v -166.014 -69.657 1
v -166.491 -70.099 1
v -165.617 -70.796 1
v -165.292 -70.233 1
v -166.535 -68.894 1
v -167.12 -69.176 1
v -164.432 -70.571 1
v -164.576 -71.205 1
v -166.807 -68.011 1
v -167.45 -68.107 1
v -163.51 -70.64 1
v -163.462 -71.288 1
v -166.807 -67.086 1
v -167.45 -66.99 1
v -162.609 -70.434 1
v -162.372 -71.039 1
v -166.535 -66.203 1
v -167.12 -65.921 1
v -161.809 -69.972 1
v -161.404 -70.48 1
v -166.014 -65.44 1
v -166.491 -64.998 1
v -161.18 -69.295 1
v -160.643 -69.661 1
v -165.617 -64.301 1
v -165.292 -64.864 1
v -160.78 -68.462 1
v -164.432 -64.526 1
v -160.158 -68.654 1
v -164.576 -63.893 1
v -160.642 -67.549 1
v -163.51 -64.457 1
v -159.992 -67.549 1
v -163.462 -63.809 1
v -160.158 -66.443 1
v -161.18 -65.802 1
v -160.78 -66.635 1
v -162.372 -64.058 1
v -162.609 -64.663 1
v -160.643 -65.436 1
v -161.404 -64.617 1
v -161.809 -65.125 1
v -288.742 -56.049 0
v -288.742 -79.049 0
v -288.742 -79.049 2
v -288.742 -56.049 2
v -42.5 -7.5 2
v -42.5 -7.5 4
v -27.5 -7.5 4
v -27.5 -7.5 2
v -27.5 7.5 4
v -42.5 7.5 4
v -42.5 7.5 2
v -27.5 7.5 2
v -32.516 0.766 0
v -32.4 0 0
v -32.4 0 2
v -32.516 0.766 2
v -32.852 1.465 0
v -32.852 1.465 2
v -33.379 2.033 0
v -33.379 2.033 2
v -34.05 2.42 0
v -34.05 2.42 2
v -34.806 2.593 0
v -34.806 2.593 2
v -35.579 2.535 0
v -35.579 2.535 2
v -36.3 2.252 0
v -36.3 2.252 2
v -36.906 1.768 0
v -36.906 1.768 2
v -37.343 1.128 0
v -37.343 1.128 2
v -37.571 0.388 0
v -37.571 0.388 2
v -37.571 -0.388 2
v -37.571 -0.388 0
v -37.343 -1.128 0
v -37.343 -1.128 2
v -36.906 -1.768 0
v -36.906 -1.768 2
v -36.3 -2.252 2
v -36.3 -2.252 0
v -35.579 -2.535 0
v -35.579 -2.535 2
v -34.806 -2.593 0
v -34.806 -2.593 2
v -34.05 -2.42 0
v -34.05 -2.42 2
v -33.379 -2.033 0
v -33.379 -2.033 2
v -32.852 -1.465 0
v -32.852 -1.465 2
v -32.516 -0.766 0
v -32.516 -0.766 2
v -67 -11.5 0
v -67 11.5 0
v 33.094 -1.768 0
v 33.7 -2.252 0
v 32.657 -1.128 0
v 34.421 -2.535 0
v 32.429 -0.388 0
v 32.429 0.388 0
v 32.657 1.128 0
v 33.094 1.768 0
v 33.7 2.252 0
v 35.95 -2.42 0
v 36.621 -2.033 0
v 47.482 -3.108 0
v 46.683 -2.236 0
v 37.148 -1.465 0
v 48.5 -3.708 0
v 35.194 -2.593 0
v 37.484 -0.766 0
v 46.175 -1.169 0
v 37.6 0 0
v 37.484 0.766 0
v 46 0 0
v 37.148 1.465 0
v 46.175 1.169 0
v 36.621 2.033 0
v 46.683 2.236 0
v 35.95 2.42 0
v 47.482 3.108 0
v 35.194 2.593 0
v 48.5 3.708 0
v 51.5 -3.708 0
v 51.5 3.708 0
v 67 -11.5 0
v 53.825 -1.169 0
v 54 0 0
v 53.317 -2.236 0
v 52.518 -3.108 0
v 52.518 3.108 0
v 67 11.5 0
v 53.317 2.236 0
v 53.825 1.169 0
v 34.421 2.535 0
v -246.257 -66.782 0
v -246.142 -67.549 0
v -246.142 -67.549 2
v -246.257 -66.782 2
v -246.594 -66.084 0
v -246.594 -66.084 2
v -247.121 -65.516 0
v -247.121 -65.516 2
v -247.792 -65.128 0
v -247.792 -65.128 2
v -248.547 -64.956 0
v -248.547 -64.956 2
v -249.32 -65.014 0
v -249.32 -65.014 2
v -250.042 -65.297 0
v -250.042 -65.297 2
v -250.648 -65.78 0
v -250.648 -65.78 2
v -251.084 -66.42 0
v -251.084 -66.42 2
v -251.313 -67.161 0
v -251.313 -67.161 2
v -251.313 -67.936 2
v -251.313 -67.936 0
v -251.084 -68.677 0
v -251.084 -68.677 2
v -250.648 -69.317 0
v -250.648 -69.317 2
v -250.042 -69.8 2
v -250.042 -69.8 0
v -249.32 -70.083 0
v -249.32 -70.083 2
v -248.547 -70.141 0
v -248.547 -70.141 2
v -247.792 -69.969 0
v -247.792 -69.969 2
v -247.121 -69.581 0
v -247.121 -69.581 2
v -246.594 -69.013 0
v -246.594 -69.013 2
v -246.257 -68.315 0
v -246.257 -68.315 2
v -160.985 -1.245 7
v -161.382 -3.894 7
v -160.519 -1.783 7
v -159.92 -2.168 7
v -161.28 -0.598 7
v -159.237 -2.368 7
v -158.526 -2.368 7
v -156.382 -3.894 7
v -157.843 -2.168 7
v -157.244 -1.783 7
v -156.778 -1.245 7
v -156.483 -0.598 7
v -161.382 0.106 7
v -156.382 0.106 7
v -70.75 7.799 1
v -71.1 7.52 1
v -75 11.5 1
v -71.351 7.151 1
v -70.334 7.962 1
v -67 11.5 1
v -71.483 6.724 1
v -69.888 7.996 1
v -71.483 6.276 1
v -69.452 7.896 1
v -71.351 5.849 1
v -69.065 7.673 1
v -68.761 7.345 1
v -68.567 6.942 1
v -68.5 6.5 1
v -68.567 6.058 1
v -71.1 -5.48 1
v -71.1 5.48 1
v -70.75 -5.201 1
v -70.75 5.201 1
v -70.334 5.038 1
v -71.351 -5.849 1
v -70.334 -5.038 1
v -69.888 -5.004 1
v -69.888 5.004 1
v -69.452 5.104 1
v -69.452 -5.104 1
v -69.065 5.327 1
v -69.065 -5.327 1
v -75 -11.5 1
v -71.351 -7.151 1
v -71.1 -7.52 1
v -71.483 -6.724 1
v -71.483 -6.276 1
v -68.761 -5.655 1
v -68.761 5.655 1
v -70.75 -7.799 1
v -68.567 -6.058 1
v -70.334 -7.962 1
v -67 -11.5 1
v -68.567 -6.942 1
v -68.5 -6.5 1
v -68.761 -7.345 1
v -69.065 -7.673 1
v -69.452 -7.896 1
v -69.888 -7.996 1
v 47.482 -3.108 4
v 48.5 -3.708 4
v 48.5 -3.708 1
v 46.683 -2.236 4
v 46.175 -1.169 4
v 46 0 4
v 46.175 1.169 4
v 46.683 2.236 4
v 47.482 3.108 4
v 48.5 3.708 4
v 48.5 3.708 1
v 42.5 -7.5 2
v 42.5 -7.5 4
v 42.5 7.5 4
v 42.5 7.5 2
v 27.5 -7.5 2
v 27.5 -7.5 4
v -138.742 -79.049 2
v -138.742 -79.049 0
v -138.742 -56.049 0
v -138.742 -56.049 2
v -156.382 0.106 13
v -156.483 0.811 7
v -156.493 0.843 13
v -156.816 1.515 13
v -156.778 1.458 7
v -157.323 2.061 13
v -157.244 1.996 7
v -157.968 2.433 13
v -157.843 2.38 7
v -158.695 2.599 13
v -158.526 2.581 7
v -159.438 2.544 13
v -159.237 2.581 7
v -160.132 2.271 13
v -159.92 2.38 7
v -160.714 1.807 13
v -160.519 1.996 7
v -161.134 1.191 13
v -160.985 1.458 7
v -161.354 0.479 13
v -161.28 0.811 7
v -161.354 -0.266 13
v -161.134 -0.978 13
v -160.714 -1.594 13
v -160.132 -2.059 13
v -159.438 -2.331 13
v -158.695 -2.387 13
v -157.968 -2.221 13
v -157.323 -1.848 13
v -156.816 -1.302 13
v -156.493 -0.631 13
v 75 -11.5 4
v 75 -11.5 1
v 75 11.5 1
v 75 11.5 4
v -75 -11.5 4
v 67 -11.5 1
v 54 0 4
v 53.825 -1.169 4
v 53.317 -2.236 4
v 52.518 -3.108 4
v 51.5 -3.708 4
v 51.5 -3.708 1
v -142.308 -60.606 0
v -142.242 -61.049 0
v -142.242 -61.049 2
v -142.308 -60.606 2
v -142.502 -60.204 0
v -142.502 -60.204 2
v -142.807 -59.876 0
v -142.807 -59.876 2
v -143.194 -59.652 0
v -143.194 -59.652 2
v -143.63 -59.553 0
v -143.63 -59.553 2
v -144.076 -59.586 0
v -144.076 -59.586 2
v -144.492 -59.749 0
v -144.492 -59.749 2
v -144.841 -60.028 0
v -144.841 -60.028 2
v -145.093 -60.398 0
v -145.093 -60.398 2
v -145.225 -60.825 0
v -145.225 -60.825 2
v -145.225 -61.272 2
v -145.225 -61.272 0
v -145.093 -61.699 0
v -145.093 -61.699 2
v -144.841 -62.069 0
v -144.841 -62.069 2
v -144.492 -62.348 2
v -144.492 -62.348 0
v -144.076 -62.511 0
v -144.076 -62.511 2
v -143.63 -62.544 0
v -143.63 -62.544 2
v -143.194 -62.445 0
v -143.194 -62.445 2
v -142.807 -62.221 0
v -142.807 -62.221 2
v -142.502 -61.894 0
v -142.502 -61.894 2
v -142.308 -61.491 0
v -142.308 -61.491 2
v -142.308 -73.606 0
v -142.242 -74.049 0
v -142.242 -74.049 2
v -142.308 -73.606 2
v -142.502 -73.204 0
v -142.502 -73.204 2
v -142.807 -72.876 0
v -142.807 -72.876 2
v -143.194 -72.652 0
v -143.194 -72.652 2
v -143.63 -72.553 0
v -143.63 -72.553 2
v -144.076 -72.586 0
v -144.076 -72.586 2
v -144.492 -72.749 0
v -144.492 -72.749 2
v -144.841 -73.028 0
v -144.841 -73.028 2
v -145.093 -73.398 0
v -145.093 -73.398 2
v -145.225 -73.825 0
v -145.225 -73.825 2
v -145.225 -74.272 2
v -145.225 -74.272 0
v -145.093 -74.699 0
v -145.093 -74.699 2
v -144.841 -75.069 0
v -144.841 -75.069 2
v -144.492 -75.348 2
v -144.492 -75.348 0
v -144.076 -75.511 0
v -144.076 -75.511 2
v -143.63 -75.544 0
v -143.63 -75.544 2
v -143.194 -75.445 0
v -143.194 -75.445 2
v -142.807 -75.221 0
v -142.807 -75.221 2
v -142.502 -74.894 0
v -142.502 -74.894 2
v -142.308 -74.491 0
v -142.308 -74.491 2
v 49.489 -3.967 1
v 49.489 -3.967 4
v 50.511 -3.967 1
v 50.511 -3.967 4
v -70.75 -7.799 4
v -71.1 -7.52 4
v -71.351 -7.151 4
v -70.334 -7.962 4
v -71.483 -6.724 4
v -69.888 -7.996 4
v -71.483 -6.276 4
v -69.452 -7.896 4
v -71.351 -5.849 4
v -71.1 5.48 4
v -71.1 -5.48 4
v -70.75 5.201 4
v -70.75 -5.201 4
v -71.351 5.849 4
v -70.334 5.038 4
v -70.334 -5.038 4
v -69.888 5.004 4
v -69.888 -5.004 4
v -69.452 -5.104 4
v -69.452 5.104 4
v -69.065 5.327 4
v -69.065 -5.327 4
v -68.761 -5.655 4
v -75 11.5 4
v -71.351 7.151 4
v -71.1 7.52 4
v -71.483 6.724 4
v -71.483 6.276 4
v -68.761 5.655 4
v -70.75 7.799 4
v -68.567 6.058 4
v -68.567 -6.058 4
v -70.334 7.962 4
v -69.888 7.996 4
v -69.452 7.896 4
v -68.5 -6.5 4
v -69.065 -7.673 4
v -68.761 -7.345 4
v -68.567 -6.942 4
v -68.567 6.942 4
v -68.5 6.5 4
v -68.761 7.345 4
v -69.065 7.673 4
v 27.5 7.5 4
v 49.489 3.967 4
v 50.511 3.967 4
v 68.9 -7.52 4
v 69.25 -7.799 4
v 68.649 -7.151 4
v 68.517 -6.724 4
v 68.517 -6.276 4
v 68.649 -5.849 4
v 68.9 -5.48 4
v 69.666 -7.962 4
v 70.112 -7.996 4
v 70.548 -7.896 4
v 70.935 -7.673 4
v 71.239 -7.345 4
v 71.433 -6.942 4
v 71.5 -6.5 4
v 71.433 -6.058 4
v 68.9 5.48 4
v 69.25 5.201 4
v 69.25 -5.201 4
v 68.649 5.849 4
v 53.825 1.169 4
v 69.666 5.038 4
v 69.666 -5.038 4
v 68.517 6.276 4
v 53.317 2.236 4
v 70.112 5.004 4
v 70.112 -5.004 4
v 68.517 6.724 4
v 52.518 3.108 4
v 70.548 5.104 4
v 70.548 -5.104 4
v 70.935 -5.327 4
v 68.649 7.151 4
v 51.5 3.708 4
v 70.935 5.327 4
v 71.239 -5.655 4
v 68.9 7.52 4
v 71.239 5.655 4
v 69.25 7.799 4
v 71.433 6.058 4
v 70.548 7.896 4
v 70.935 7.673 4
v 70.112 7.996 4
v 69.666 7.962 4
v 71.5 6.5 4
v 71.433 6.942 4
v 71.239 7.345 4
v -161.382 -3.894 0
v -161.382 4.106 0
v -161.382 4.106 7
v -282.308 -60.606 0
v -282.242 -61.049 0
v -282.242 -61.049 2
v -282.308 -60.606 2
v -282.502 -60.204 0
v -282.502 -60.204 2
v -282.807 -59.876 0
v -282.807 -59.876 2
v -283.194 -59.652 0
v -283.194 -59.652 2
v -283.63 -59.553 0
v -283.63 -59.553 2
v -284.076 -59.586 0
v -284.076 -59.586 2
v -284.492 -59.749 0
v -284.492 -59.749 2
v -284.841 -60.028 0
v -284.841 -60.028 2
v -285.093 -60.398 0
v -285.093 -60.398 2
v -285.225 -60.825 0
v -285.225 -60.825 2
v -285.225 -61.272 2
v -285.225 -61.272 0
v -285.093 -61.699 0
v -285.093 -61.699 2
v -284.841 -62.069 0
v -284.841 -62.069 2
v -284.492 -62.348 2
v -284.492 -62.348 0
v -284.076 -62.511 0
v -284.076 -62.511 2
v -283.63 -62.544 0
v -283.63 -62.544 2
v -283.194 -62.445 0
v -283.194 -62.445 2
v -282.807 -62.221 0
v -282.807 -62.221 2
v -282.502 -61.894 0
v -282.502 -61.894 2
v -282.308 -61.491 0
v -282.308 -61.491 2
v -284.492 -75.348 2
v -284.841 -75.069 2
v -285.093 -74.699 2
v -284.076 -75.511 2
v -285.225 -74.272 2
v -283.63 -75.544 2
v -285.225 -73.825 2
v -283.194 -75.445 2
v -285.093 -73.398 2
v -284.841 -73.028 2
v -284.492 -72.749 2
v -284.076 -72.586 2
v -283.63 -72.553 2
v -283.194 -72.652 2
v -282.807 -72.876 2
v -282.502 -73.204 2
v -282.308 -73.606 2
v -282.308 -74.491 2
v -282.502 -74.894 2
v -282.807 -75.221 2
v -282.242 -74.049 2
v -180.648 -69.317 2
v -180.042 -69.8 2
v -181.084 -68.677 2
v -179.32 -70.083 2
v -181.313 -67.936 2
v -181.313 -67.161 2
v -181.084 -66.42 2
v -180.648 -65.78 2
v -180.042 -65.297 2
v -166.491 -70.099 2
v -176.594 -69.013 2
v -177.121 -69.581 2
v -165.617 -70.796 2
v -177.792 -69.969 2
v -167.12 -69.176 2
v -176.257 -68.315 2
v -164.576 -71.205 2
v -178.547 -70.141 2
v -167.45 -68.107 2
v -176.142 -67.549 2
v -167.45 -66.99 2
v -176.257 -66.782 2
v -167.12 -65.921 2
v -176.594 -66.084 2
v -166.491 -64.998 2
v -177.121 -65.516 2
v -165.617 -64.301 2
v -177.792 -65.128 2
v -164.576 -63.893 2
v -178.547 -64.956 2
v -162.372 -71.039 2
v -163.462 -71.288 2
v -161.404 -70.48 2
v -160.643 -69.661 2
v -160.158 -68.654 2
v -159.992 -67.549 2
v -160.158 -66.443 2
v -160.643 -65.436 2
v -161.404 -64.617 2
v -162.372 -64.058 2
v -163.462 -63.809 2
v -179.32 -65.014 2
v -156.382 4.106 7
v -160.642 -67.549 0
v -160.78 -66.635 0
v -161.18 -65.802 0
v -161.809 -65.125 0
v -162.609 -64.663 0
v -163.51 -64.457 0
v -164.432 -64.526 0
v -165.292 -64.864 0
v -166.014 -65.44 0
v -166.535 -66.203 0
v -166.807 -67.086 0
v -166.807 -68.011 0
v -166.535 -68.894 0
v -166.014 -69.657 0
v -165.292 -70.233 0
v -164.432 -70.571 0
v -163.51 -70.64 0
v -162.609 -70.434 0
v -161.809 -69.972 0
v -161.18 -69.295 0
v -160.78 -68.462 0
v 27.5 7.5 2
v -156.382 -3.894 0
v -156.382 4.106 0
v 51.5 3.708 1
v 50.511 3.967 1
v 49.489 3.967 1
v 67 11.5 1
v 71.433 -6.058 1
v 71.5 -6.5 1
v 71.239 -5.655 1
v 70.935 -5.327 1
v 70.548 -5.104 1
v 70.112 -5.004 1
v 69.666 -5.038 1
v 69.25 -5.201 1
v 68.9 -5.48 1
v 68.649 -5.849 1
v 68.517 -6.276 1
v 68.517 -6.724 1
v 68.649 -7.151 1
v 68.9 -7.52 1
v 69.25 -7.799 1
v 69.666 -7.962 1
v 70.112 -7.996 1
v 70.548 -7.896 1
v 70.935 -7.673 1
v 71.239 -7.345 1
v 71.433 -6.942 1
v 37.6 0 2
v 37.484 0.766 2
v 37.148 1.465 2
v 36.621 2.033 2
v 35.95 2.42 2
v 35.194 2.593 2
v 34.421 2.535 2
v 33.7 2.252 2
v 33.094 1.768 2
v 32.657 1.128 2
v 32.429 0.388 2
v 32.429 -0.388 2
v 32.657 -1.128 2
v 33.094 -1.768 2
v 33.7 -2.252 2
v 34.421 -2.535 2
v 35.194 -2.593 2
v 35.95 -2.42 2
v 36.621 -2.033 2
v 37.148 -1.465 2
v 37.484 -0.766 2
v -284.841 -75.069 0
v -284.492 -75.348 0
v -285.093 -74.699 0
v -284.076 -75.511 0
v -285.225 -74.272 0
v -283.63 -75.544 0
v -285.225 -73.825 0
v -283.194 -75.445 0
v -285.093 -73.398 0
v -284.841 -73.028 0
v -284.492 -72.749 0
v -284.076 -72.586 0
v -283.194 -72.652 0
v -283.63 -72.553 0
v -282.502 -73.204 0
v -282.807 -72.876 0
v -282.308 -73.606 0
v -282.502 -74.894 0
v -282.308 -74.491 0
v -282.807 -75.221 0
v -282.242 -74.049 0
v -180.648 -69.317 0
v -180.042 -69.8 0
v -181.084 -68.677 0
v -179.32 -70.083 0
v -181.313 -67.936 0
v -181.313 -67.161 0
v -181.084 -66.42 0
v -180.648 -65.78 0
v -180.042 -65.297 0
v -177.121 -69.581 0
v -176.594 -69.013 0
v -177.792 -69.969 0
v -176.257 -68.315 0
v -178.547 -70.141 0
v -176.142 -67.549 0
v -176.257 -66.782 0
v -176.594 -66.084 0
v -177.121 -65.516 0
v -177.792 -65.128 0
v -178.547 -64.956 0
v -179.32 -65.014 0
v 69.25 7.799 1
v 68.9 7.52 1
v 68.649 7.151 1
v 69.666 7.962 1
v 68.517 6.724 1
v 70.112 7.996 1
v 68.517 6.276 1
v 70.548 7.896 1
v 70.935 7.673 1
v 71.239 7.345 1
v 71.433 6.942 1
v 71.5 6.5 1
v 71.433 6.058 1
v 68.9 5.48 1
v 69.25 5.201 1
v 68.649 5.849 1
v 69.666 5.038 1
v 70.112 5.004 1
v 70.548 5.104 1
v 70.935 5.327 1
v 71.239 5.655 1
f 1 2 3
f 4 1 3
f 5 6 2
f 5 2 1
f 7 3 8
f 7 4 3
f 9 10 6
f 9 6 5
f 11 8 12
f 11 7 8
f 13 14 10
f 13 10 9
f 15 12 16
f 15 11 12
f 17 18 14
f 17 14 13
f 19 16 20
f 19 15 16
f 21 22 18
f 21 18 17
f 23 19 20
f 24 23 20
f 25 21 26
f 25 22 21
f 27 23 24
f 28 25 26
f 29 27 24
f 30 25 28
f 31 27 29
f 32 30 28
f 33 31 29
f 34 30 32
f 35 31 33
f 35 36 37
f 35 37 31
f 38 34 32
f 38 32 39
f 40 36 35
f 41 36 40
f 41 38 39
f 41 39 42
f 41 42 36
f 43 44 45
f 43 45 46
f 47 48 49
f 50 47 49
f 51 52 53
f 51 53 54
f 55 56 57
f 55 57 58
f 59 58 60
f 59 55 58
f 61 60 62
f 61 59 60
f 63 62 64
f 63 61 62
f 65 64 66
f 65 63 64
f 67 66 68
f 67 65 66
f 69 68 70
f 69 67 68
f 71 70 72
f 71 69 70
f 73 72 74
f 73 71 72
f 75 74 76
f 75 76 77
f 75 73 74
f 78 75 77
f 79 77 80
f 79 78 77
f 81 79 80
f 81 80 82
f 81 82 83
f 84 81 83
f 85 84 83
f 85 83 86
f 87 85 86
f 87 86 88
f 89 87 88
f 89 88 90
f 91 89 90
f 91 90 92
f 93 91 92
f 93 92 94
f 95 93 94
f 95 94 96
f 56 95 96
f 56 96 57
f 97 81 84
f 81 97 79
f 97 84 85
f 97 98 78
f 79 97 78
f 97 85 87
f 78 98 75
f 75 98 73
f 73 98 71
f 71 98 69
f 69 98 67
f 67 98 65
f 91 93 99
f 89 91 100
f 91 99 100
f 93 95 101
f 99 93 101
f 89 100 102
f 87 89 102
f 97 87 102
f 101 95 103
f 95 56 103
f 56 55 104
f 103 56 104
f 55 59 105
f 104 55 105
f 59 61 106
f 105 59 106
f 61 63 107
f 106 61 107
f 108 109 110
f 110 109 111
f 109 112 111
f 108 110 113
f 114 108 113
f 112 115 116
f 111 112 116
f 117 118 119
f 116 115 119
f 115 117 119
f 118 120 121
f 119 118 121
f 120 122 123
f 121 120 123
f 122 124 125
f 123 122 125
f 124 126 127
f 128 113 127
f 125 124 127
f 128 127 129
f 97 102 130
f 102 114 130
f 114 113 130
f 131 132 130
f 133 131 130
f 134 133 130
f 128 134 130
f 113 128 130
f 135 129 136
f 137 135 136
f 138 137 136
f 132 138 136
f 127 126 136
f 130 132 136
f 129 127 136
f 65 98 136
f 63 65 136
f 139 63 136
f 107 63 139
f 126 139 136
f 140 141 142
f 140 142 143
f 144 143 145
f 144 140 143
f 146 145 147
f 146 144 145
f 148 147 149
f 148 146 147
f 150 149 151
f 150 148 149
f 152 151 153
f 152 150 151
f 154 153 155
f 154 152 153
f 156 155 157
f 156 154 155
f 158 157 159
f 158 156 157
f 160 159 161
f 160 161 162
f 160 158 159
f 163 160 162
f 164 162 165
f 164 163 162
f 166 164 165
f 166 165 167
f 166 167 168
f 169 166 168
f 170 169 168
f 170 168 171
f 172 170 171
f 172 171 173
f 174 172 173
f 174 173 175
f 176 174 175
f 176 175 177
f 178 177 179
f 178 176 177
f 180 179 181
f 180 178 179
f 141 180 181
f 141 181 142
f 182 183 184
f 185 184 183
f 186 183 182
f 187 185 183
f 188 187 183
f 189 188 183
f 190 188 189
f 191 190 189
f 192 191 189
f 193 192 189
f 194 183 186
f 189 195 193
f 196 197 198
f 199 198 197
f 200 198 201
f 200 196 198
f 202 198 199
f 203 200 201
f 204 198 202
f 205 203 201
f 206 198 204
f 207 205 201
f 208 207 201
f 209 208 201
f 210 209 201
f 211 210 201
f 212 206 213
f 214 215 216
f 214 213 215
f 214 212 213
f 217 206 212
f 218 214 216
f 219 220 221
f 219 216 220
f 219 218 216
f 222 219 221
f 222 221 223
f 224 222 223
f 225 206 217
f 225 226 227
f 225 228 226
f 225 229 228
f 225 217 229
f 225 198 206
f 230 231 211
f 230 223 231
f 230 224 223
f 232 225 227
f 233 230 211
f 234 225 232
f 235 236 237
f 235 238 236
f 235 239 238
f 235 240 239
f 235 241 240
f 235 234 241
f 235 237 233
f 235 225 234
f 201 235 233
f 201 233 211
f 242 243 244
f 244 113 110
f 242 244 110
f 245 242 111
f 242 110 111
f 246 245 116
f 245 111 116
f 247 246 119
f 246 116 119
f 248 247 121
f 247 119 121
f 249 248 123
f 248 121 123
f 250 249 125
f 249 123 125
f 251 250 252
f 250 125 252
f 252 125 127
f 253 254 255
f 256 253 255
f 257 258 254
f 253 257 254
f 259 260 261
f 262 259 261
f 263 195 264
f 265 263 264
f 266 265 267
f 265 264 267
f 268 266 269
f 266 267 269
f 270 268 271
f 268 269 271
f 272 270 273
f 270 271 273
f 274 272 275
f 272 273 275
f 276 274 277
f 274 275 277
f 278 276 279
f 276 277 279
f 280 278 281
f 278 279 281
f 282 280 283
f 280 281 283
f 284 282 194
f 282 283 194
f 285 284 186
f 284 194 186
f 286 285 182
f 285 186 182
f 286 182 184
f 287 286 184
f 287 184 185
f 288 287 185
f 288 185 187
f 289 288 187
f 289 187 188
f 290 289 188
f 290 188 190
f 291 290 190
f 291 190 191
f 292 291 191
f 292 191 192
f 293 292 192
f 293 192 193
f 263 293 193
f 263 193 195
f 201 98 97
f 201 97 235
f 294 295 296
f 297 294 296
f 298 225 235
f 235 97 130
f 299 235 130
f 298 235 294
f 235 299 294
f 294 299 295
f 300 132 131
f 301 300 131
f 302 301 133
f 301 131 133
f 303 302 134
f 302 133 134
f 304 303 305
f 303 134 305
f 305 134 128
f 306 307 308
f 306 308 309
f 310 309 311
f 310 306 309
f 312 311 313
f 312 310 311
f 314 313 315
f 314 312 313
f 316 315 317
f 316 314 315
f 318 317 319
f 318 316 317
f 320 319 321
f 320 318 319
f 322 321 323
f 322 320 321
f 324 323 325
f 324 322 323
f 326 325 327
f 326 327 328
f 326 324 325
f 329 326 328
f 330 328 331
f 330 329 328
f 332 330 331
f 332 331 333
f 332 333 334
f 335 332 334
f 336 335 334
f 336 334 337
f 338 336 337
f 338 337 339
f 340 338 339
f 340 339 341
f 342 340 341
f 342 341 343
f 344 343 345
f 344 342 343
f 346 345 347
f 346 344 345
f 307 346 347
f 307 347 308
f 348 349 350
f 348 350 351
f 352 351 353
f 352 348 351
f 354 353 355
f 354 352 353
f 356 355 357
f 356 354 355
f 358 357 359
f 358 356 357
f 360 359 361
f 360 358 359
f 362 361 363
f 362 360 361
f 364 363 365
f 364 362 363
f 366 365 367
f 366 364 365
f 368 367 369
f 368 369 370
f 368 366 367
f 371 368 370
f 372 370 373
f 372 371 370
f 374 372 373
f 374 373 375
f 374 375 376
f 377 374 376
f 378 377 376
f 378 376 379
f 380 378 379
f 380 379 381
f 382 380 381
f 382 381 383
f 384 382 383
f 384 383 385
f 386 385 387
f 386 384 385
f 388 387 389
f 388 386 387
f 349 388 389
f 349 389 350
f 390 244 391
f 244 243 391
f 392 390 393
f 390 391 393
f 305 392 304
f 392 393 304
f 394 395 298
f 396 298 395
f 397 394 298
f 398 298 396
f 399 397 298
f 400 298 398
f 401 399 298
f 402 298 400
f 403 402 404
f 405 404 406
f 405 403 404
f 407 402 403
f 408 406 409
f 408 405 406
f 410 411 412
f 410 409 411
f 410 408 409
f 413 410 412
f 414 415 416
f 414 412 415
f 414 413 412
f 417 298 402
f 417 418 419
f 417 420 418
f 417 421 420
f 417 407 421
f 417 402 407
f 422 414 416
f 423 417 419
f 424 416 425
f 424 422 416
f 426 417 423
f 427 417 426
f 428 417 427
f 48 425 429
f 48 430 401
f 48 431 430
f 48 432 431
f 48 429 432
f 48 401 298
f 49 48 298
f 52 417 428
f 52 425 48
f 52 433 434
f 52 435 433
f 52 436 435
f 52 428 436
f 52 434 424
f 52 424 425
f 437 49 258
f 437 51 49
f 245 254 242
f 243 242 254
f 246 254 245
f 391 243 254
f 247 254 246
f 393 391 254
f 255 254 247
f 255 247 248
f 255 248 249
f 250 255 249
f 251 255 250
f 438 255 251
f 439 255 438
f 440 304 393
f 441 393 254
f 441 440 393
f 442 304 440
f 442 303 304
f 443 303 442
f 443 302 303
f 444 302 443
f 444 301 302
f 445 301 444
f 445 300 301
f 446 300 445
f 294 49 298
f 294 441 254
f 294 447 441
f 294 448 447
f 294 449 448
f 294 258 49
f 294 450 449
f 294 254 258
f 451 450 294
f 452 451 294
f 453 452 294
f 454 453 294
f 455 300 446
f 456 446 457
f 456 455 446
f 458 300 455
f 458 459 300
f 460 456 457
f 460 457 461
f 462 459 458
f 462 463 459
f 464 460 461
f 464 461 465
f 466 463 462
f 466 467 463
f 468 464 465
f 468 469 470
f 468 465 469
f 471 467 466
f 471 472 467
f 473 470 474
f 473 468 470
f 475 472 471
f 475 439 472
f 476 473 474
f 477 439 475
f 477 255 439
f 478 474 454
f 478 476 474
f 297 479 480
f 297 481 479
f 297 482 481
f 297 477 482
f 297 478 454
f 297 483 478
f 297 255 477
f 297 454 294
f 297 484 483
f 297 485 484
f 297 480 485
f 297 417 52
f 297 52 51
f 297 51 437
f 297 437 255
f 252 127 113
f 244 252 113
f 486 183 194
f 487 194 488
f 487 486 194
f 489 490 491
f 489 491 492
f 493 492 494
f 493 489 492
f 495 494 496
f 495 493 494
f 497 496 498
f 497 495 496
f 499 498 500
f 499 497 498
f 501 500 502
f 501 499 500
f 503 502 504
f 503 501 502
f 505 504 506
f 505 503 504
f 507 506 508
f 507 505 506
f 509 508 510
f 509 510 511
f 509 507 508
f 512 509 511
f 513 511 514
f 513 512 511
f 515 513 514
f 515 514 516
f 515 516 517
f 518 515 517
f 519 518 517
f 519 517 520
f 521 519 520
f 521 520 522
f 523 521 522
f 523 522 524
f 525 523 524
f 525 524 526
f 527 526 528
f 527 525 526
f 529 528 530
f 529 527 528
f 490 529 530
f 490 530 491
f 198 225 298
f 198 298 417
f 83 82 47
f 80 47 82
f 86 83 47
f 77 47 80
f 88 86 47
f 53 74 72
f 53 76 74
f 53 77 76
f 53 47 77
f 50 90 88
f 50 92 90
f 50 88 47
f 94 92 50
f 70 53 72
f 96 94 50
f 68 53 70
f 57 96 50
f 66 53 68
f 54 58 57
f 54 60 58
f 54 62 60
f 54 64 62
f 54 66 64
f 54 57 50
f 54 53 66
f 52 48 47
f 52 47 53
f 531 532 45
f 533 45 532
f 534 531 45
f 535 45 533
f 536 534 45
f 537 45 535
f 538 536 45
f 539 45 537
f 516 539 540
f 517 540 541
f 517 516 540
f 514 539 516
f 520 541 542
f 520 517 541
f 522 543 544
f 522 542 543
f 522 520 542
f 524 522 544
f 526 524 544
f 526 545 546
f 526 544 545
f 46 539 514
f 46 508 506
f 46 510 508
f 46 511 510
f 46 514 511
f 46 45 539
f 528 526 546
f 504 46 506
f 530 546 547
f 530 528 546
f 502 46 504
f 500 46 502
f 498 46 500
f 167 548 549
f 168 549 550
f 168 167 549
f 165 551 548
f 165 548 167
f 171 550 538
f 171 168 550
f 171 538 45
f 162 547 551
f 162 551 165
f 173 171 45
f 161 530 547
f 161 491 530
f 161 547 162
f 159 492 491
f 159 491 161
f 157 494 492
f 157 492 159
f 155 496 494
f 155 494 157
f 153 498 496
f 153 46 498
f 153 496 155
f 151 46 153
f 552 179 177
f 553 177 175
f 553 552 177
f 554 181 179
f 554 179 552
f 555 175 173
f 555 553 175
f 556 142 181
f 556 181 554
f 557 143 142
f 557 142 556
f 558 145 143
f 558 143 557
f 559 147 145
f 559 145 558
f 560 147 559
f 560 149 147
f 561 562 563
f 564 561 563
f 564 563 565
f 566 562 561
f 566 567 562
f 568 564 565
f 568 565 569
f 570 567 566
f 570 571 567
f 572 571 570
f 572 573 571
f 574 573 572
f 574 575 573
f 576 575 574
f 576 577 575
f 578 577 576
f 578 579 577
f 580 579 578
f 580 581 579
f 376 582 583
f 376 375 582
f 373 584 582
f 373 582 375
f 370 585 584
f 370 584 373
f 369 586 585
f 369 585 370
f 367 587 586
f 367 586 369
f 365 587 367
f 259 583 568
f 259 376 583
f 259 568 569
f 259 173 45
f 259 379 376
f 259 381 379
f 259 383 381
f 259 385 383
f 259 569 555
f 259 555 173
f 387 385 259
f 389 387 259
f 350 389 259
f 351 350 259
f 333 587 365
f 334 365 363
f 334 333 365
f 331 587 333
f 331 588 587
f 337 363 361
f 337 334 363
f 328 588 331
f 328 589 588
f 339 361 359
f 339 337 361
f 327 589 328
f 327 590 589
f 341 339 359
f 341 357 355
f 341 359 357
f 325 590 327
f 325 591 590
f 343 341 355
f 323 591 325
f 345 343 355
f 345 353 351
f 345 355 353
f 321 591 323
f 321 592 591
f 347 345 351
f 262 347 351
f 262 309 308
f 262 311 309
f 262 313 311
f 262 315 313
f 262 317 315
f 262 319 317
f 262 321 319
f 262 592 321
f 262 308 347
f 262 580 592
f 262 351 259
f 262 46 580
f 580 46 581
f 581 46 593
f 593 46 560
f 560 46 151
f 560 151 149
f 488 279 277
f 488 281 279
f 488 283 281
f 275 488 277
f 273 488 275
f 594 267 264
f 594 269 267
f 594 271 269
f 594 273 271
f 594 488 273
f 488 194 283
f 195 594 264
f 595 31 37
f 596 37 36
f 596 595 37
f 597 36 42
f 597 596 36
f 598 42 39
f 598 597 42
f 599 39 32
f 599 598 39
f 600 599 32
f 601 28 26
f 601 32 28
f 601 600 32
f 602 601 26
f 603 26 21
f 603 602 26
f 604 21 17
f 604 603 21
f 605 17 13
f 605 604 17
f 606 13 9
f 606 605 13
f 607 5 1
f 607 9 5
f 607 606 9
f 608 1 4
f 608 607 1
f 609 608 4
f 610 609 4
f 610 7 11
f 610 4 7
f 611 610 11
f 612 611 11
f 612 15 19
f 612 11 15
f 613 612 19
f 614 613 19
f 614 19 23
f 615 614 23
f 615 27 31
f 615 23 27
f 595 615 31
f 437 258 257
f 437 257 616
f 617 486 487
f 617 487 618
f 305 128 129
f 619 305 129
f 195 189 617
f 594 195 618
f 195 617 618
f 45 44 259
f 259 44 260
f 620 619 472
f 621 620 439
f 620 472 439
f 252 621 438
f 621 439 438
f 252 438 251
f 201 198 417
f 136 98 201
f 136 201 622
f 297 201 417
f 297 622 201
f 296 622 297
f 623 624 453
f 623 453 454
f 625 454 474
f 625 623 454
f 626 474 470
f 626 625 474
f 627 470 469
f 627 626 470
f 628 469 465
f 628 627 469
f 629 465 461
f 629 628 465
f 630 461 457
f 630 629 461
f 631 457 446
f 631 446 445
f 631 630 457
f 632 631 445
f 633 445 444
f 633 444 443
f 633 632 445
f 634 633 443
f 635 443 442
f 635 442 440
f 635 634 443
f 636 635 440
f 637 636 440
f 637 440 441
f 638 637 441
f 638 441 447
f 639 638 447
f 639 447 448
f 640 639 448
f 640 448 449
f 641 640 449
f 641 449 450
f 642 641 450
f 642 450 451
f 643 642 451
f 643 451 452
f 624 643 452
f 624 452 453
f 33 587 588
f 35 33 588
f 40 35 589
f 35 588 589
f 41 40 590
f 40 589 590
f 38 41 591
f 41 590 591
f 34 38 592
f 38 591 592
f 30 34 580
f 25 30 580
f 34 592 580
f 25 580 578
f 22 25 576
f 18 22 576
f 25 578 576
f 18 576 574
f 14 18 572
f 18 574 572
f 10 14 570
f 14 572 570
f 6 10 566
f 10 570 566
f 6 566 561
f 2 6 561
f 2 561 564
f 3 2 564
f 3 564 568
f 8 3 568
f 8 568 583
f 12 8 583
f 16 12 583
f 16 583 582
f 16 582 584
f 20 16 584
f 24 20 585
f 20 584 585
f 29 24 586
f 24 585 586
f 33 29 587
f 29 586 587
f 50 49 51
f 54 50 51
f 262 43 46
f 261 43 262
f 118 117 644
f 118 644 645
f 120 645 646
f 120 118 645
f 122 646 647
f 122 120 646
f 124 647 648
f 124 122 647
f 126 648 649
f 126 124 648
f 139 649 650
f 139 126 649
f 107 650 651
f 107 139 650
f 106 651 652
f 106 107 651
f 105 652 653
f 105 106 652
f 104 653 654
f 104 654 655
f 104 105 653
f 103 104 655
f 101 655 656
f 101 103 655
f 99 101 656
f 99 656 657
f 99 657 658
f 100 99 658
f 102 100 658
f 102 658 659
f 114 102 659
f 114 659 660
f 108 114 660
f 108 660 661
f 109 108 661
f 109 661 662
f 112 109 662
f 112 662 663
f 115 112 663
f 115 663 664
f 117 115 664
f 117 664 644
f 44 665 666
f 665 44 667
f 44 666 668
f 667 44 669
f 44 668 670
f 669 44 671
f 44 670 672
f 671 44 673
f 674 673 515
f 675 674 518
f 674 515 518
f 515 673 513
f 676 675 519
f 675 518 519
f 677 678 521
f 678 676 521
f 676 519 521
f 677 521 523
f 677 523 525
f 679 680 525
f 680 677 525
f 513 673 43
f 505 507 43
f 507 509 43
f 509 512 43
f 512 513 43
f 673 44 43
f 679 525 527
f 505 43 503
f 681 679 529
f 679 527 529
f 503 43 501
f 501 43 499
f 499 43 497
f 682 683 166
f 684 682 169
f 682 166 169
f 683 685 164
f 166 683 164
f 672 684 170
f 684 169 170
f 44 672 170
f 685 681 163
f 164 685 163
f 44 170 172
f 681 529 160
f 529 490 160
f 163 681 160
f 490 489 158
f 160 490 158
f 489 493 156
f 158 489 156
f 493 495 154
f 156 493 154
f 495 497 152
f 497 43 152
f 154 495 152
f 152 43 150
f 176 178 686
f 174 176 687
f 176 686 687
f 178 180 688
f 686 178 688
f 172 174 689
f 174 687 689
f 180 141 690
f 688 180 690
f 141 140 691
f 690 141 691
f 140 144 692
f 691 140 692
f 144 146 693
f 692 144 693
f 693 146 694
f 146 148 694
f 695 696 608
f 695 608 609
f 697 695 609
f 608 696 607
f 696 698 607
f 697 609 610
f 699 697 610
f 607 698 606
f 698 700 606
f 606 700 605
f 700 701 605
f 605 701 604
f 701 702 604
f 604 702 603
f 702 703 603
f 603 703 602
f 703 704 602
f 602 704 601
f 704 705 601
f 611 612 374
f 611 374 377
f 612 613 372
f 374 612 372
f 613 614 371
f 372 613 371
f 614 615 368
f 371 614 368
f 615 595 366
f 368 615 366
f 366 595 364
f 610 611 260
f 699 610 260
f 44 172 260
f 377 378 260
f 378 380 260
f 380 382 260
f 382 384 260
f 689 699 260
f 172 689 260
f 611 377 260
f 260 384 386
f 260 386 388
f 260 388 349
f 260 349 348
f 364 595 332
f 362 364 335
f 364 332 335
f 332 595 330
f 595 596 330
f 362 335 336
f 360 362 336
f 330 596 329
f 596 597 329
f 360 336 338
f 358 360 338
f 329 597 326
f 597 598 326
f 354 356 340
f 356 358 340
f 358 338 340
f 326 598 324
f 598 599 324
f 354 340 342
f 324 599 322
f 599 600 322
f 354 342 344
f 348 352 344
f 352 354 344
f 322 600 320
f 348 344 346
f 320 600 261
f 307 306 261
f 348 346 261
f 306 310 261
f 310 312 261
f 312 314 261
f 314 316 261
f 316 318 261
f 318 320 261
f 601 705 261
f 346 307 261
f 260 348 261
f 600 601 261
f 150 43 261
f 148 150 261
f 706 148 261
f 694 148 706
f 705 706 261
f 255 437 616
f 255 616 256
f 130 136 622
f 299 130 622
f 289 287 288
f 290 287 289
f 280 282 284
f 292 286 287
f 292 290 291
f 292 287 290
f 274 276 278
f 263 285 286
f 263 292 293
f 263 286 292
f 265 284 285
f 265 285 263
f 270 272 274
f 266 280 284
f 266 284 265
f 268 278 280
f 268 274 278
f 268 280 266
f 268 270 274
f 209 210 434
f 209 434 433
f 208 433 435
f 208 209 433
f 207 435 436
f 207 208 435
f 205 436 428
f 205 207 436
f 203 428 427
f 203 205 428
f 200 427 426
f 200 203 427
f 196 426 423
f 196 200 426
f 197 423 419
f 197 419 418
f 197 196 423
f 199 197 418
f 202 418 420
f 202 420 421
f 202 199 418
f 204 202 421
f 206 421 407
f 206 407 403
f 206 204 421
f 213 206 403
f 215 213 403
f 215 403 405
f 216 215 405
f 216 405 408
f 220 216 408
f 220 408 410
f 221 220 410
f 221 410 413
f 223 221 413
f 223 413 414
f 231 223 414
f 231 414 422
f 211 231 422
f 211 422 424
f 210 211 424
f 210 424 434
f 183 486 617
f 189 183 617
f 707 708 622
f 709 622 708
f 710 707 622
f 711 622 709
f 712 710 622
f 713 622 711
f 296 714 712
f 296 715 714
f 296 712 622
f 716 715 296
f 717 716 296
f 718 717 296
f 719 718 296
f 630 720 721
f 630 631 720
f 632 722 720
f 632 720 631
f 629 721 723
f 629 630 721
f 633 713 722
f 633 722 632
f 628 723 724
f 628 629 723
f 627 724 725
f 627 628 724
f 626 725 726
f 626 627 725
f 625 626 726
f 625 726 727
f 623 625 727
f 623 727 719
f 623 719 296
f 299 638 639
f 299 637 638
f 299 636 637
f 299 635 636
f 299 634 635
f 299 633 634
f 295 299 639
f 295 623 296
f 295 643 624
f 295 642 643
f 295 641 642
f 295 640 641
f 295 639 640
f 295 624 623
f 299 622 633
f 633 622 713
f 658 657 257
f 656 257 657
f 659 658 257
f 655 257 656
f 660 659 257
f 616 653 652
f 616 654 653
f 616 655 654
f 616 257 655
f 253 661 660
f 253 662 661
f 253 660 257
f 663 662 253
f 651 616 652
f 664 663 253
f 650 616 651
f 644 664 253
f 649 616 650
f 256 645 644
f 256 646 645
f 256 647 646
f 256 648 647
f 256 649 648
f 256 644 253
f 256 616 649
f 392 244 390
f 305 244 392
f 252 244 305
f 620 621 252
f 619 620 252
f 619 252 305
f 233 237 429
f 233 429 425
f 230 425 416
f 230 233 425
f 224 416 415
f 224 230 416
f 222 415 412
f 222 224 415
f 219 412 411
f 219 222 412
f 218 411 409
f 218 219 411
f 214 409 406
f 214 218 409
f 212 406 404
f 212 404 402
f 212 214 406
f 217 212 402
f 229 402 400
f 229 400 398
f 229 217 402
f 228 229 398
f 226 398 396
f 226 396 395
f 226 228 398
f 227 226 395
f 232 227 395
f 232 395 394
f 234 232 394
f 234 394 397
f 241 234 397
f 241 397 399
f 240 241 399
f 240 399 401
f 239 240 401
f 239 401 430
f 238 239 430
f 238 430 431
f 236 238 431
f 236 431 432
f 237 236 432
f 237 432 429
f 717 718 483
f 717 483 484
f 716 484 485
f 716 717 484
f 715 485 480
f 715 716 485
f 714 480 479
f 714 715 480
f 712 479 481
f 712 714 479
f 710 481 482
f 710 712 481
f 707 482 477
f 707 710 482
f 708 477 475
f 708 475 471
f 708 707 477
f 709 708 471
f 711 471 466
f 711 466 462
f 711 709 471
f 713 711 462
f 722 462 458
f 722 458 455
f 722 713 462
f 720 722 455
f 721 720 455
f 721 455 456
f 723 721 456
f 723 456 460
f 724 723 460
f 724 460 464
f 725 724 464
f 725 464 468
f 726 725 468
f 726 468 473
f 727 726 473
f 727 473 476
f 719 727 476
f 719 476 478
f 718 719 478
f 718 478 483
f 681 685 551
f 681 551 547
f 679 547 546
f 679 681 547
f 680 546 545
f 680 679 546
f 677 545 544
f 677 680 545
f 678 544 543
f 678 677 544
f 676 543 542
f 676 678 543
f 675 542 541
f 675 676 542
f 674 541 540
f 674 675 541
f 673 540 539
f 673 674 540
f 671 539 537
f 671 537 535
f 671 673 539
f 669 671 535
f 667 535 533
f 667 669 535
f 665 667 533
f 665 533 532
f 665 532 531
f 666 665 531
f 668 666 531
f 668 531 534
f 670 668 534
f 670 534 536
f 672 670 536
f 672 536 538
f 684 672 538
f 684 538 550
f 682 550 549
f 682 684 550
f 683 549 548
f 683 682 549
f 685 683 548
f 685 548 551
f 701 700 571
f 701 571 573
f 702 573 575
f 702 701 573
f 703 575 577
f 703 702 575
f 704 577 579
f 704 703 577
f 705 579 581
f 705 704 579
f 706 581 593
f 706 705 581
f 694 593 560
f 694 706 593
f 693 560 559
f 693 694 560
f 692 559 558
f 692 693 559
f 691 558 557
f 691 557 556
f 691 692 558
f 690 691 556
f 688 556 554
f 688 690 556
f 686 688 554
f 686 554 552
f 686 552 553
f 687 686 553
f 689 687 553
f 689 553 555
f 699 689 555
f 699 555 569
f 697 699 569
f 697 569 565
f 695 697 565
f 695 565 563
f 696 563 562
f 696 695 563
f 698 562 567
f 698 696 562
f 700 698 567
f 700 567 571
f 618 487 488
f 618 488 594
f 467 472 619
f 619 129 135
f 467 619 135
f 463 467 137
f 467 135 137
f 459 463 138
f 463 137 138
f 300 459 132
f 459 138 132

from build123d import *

# Parameters (mm, degrees)
F1_W      = 5
F1_H      = 8
F2_DEPTH  = 7
F4_DEPTH  = 6
F0_W      = 150
F0_H      = 23
F0_R      = 1.5
F0_R_2    = 2.6
F5_DEPTH  = 4
F6_W      = 150
F6_H      = 23
F6_R      = 1.5
F6_R_2    = 2.6
F6_R_3    = 3.1
F7_DEPTH  = 2
F8_R      = 3.75
F9_DEPTH  = 1
F10_W     = 8
F10_H     = 1
F11_DEPTH = 30
F12_W     = 15
F12_H     = 15
F12_R     = 2.6
F13_DEPTH = 2
F14_R     = 4
F15_DEPTH = 3


with BuildPart() as f2:
    # F1 (on Top) → F2 (new body)
    with BuildSketch(Plane.XY):
        with Locations((-158.881617, 0.106313)):
            Rectangle(F1_W, F1_H)
    extrude(amount=F2_DEPTH)

    # F3 (on face) → F4 (join)
    with BuildSketch(Plane.XY.offset(7)):
        with BuildLine():
            ThreePointArc((-161.381617, 0.106313), (-158.881617, -2.393687), (-156.381617, 0.106313))
            ThreePointArc((-156.381617, 0.106313), (-158.881617, 2.606313), (-161.381617, 0.106313))
        make_face()
    extrude(amount=F4_DEPTH)


with BuildPart() as f5:
    # F0 (on Top) → F5 (new body)
    with BuildSketch(Plane.XY):
        Rectangle(F0_W, F0_H)
        with Locations((-70, -6.5)):
            Circle(F0_R, mode=Mode.SUBTRACT)
        with Locations((70, -6.5)):
            Circle(F0_R, mode=Mode.SUBTRACT)
        with Locations((-35, 0)):
            Circle(F0_R_2, mode=Mode.SUBTRACT)
        with Locations((-70, 6.5)):
            Circle(F0_R, mode=Mode.SUBTRACT)
        with Locations((35, 0)):
            Circle(F0_R_2, mode=Mode.SUBTRACT)
        with BuildLine():
            ThreePointArc((51.5, 3.708099), (53.316625, 2.236068), (54, 0))
            ThreePointArc((54, 0), (53.316625, -2.236068), (51.5, -3.708099))
            ThreePointArc((51.5, -3.708099), (50, -4), (48.5, -3.708099))
            ThreePointArc((48.5, -3.708099), (46, 0), (48.5, 3.708099))
            ThreePointArc((48.5, 3.708099), (50, 4), (51.5, 3.708099))
        make_face(mode=Mode.SUBTRACT)
        with Locations((70, 6.5)):
            Circle(F0_R, mode=Mode.SUBTRACT)
        with BuildLine():
            Line((51.5, -3.708099), (51.5, 3.708099))
            ThreePointArc((51.5, 3.708099), (50, 4), (48.5, 3.708099))
            Line((48.5, 3.708099), (48.5, -3.708099))
            ThreePointArc((48.5, -3.708099), (50, -4), (51.5, -3.708099))
        make_face()
    extrude(amount=F5_DEPTH)

    # F10 (on face) → F11 (cut)
    with BuildSketch(Plane.XZ.offset(11.5)):
        with Locations((-71, 0.5)):
            Rectangle(F10_W, F10_H)
        with Locations((71, 0.5)):
            Rectangle(F10_W, F10_H)
    extrude(amount=-F11_DEPTH, mode=Mode.SUBTRACT)

    # F12 (on face) → F13 (cut)
    with BuildSketch(Plane.XY.offset(4)):
        with Locations((-35, 0)):
            Rectangle(F12_W, F12_H)
        with Locations((-35, 0)):
            Circle(F12_R, mode=Mode.SUBTRACT)
        with Locations((35, 0)):
            Rectangle(F12_W, F12_H)
        with Locations((35, 0)):
            Circle(F12_R, mode=Mode.SUBTRACT)
    extrude(amount=-F13_DEPTH, mode=Mode.SUBTRACT)

    # F14 (on face) → F15 (cut)
    with BuildSketch(Plane.XY.offset(4)):
        with Locations((50, 0)):
            Circle(F14_R)
    extrude(amount=-F15_DEPTH, mode=Mode.SUBTRACT)


with BuildPart() as f7:
    # F6 (on Top) → F7 (new body)
    with BuildSketch(Plane.XY):
        with Locations((-213.741779, -67.548528)):
            Rectangle(F6_W, F6_H)
        with Locations((-283.741779, -74.048528)):
            Circle(F6_R, mode=Mode.SUBTRACT)
        with Locations((-143.741779, -74.048528)):
            Circle(F6_R, mode=Mode.SUBTRACT)
        with Locations((-248.741779, -67.548528)):
            Circle(F6_R_2, mode=Mode.SUBTRACT)
        with Locations((-283.741779, -61.048528)):
            Circle(F6_R, mode=Mode.SUBTRACT)
        with Locations((-178.741779, -67.548528)):
            Circle(F6_R_2, mode=Mode.SUBTRACT)
        with Locations((-163.741779, -67.548528)):
            Circle(F6_R_3, mode=Mode.SUBTRACT)
        with Locations((-143.741779, -61.048528)):
            Circle(F6_R, mode=Mode.SUBTRACT)
    extrude(amount=F7_DEPTH)

    # F8 (on face) → F9 (cut)
    with BuildSketch(Plane.XY.offset(2)):
        with Locations((-163.741779, -67.548528)):
            Circle(F8_R)
    extrude(amount=-F9_DEPTH, mode=Mode.SUBTRACT)


solid = Compound([f2.part, f5.part, f7.part])
